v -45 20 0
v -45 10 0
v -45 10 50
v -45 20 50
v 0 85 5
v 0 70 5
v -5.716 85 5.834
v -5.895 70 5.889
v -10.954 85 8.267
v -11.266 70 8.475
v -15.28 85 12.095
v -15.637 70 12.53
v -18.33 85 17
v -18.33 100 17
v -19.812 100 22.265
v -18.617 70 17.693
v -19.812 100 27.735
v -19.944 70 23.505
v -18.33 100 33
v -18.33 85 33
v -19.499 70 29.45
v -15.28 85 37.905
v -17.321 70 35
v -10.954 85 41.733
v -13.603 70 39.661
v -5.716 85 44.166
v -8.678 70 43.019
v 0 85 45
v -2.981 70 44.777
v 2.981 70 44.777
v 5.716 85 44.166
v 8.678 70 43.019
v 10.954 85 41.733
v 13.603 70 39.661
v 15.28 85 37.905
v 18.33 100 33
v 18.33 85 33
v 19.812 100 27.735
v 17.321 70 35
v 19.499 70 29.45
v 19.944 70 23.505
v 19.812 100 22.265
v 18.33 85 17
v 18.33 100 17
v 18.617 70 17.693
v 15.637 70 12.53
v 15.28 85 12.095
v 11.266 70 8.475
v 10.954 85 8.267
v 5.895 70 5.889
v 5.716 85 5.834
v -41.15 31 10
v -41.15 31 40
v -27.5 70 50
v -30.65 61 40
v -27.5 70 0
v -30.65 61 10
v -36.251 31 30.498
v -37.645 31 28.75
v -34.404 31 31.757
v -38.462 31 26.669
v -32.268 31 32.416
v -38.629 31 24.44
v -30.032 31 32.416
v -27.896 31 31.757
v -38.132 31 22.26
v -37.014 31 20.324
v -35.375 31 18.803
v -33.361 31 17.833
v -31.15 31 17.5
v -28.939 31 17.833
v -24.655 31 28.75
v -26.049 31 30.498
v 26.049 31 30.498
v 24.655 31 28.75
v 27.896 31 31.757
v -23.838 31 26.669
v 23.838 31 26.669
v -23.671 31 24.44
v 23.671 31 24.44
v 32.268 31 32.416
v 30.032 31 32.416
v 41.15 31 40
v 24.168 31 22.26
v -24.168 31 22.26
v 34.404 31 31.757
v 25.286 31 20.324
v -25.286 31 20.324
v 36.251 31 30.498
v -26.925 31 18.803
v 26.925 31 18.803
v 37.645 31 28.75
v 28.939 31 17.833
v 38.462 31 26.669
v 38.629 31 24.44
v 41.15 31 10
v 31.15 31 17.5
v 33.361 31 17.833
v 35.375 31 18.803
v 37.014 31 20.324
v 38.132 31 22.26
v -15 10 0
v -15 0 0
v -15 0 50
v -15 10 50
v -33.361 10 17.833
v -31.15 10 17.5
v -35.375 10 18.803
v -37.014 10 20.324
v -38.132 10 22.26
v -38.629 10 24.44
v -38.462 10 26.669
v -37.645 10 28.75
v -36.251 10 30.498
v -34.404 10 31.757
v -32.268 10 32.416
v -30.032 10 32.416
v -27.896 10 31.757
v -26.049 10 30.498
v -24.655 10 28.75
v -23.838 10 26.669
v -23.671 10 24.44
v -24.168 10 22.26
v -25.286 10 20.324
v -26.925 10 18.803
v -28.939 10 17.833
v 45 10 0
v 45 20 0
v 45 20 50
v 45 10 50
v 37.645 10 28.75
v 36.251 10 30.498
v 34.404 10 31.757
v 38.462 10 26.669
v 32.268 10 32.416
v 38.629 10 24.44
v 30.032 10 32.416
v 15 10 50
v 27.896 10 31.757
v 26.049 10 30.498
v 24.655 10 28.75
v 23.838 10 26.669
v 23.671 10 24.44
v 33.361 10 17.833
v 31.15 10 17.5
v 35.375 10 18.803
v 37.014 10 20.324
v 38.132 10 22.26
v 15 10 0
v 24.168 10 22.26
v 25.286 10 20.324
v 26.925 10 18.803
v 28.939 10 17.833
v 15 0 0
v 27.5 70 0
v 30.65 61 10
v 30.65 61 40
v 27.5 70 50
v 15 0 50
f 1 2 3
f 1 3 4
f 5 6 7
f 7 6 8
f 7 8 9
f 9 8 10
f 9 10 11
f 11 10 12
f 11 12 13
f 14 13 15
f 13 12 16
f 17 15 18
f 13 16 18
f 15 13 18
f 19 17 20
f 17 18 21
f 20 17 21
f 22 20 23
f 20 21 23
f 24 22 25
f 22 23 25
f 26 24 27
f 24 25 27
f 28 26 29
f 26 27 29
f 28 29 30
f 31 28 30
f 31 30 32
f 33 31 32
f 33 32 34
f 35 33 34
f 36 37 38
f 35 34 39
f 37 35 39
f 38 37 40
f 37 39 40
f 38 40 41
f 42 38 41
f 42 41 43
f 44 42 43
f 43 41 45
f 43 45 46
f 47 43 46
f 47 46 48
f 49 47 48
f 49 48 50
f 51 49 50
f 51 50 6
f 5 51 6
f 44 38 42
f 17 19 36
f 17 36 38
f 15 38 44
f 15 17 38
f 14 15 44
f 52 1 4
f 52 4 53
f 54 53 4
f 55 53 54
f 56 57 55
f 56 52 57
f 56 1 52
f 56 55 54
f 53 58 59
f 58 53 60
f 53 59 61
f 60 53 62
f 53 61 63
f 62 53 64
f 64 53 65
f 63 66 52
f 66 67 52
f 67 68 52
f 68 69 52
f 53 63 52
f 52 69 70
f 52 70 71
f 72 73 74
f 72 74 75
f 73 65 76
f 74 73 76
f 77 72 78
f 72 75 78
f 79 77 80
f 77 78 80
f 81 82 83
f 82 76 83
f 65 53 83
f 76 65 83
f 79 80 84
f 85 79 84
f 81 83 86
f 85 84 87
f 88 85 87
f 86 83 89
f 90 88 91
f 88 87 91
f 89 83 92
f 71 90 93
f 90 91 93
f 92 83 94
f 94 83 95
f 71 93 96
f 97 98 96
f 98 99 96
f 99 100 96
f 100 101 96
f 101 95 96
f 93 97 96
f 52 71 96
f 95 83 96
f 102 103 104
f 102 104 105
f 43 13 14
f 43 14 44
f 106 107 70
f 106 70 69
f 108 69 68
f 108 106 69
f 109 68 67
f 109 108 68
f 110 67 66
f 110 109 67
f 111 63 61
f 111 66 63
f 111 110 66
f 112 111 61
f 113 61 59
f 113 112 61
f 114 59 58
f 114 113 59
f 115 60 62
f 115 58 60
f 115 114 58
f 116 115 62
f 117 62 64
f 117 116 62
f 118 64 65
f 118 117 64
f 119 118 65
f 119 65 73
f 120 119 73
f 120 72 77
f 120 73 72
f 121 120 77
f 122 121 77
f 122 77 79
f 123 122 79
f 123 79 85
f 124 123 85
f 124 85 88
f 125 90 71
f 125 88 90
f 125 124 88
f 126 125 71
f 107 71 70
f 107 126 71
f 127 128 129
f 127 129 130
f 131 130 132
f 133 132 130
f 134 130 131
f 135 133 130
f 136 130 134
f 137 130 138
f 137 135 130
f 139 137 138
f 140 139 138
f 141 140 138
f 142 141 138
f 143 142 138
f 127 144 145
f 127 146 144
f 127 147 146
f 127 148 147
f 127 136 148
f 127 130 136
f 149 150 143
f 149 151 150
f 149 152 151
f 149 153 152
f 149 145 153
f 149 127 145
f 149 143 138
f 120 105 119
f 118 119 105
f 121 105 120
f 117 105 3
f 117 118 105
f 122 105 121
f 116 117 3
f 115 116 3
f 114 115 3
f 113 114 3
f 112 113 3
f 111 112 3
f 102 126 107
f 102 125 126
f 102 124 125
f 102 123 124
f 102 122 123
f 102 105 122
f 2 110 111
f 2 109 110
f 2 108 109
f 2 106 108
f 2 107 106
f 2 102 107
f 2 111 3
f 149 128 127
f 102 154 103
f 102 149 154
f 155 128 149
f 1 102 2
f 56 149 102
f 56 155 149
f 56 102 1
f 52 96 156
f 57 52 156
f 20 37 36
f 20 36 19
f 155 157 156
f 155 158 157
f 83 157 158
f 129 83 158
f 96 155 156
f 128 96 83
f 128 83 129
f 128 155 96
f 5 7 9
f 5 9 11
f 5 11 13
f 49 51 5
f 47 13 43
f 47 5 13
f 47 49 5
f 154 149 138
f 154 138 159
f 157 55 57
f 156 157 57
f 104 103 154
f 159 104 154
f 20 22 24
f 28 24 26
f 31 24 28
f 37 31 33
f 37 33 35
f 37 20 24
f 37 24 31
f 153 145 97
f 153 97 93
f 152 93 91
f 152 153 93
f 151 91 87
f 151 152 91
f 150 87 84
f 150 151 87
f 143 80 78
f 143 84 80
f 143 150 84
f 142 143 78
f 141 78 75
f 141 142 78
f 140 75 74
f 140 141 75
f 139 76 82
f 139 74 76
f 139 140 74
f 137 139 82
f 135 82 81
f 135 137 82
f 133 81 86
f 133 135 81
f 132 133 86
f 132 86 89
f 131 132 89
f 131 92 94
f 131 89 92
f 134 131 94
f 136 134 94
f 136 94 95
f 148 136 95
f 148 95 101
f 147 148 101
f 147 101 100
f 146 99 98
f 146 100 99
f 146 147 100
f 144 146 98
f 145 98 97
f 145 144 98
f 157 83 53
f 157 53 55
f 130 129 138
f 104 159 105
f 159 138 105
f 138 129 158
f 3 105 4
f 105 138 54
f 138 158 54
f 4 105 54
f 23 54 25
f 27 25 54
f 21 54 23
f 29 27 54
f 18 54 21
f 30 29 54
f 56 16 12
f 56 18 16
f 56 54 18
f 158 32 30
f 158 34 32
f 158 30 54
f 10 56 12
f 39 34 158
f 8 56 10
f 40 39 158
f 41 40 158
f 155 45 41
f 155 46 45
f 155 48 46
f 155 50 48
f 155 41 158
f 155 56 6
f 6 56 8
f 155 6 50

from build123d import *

# Parameters (mm, degrees)
BOSS_EXTRUDE1_DEPTH = 50
SKETCH2_W           = 30
SKETCH2_H           = 30
CUT_EXTRUDE1_DEPTH  = 65
SKETCH3_R           = 7.5
CUT_EXTRUDE2_DEPTH  = 40
SKETCH4_R           = 20
BOSS_EXTRUDE2_DEPTH = 30
CUT_EXTRUDE3_START  = -15
CUT_EXTRUDE3_DEPTH  = 15


with BuildPart() as part:
    # Sketch1 → Boss-Extrude1 (new body)
    with BuildSketch(Plane.XY):
        Polygon((0, 0), (-15, 0), (-15, 10), (-45, 10), (-45, 20), (-27.5, 70), (27.5, 70), (45, 20), (45, 10), (15, 10), (15, 0), align=None)
    extrude(amount=BOSS_EXTRUDE1_DEPTH)

    # Sketch2 → Cut-Extrude1 (cut, symmetric)
    with BuildSketch(Plane(origin=(0, 0, 0), x_dir=(0, 0, -1), z_dir=(1, 0, 0))):
        with Locations((-25, 46)):
            Rectangle(SKETCH2_W, SKETCH2_H)
    extrude(amount=CUT_EXTRUDE1_DEPTH, both=True, mode=Mode.SUBTRACT)

    # Sketch3 → Cut-Extrude2 (cut)
    with BuildSketch(Plane(origin=(0, 0, 0), x_dir=(1, 0, 0), z_dir=(0, 1, 0))):
        with Locations(Location((-31.15, -25, 0), (0, 0, 90))):
            Circle(SKETCH3_R)
        with Locations(Location((31.15, -25, 0), (0, 0, 90))):
            Circle(SKETCH3_R)
    extrude(amount=CUT_EXTRUDE2_DEPTH, mode=Mode.SUBTRACT)

    # Sketch4 → Boss-Extrude2 (add)
    with BuildSketch(Plane(origin=(0, 70, 0), x_dir=(1, 0, 0), z_dir=(0, 1, 0))):
        with Locations(Location((0, -25, 0), (0, 0, 90))):
            Circle(SKETCH4_R)
    extrude(amount=BOSS_EXTRUDE2_DEPTH)

    # Sketch5 → Cut-Extrude3 (cut)
    with BuildSketch(Plane(origin=(0, 100, 0), x_dir=(1, 0, 0), z_dir=(0, 1, 0)).offset(CUT_EXTRUDE3_START)):
        with BuildLine():
            ThreePointArc((18.33030278, -17), (0, -5), (-18.33030278, -17))
            Line((-18.33030278, -17), (18.33030278, -17))
        make_face()
        with BuildLine():
            Line((18.33030278, -33), (-18.33030278, -33))
            ThreePointArc((-18.33030278, -33), (0, -45), (18.33030278, -33))
        make_face()
    extrude(amount=CUT_EXTRUDE3_DEPTH, mode=Mode.SUBTRACT)


solid = part.part
